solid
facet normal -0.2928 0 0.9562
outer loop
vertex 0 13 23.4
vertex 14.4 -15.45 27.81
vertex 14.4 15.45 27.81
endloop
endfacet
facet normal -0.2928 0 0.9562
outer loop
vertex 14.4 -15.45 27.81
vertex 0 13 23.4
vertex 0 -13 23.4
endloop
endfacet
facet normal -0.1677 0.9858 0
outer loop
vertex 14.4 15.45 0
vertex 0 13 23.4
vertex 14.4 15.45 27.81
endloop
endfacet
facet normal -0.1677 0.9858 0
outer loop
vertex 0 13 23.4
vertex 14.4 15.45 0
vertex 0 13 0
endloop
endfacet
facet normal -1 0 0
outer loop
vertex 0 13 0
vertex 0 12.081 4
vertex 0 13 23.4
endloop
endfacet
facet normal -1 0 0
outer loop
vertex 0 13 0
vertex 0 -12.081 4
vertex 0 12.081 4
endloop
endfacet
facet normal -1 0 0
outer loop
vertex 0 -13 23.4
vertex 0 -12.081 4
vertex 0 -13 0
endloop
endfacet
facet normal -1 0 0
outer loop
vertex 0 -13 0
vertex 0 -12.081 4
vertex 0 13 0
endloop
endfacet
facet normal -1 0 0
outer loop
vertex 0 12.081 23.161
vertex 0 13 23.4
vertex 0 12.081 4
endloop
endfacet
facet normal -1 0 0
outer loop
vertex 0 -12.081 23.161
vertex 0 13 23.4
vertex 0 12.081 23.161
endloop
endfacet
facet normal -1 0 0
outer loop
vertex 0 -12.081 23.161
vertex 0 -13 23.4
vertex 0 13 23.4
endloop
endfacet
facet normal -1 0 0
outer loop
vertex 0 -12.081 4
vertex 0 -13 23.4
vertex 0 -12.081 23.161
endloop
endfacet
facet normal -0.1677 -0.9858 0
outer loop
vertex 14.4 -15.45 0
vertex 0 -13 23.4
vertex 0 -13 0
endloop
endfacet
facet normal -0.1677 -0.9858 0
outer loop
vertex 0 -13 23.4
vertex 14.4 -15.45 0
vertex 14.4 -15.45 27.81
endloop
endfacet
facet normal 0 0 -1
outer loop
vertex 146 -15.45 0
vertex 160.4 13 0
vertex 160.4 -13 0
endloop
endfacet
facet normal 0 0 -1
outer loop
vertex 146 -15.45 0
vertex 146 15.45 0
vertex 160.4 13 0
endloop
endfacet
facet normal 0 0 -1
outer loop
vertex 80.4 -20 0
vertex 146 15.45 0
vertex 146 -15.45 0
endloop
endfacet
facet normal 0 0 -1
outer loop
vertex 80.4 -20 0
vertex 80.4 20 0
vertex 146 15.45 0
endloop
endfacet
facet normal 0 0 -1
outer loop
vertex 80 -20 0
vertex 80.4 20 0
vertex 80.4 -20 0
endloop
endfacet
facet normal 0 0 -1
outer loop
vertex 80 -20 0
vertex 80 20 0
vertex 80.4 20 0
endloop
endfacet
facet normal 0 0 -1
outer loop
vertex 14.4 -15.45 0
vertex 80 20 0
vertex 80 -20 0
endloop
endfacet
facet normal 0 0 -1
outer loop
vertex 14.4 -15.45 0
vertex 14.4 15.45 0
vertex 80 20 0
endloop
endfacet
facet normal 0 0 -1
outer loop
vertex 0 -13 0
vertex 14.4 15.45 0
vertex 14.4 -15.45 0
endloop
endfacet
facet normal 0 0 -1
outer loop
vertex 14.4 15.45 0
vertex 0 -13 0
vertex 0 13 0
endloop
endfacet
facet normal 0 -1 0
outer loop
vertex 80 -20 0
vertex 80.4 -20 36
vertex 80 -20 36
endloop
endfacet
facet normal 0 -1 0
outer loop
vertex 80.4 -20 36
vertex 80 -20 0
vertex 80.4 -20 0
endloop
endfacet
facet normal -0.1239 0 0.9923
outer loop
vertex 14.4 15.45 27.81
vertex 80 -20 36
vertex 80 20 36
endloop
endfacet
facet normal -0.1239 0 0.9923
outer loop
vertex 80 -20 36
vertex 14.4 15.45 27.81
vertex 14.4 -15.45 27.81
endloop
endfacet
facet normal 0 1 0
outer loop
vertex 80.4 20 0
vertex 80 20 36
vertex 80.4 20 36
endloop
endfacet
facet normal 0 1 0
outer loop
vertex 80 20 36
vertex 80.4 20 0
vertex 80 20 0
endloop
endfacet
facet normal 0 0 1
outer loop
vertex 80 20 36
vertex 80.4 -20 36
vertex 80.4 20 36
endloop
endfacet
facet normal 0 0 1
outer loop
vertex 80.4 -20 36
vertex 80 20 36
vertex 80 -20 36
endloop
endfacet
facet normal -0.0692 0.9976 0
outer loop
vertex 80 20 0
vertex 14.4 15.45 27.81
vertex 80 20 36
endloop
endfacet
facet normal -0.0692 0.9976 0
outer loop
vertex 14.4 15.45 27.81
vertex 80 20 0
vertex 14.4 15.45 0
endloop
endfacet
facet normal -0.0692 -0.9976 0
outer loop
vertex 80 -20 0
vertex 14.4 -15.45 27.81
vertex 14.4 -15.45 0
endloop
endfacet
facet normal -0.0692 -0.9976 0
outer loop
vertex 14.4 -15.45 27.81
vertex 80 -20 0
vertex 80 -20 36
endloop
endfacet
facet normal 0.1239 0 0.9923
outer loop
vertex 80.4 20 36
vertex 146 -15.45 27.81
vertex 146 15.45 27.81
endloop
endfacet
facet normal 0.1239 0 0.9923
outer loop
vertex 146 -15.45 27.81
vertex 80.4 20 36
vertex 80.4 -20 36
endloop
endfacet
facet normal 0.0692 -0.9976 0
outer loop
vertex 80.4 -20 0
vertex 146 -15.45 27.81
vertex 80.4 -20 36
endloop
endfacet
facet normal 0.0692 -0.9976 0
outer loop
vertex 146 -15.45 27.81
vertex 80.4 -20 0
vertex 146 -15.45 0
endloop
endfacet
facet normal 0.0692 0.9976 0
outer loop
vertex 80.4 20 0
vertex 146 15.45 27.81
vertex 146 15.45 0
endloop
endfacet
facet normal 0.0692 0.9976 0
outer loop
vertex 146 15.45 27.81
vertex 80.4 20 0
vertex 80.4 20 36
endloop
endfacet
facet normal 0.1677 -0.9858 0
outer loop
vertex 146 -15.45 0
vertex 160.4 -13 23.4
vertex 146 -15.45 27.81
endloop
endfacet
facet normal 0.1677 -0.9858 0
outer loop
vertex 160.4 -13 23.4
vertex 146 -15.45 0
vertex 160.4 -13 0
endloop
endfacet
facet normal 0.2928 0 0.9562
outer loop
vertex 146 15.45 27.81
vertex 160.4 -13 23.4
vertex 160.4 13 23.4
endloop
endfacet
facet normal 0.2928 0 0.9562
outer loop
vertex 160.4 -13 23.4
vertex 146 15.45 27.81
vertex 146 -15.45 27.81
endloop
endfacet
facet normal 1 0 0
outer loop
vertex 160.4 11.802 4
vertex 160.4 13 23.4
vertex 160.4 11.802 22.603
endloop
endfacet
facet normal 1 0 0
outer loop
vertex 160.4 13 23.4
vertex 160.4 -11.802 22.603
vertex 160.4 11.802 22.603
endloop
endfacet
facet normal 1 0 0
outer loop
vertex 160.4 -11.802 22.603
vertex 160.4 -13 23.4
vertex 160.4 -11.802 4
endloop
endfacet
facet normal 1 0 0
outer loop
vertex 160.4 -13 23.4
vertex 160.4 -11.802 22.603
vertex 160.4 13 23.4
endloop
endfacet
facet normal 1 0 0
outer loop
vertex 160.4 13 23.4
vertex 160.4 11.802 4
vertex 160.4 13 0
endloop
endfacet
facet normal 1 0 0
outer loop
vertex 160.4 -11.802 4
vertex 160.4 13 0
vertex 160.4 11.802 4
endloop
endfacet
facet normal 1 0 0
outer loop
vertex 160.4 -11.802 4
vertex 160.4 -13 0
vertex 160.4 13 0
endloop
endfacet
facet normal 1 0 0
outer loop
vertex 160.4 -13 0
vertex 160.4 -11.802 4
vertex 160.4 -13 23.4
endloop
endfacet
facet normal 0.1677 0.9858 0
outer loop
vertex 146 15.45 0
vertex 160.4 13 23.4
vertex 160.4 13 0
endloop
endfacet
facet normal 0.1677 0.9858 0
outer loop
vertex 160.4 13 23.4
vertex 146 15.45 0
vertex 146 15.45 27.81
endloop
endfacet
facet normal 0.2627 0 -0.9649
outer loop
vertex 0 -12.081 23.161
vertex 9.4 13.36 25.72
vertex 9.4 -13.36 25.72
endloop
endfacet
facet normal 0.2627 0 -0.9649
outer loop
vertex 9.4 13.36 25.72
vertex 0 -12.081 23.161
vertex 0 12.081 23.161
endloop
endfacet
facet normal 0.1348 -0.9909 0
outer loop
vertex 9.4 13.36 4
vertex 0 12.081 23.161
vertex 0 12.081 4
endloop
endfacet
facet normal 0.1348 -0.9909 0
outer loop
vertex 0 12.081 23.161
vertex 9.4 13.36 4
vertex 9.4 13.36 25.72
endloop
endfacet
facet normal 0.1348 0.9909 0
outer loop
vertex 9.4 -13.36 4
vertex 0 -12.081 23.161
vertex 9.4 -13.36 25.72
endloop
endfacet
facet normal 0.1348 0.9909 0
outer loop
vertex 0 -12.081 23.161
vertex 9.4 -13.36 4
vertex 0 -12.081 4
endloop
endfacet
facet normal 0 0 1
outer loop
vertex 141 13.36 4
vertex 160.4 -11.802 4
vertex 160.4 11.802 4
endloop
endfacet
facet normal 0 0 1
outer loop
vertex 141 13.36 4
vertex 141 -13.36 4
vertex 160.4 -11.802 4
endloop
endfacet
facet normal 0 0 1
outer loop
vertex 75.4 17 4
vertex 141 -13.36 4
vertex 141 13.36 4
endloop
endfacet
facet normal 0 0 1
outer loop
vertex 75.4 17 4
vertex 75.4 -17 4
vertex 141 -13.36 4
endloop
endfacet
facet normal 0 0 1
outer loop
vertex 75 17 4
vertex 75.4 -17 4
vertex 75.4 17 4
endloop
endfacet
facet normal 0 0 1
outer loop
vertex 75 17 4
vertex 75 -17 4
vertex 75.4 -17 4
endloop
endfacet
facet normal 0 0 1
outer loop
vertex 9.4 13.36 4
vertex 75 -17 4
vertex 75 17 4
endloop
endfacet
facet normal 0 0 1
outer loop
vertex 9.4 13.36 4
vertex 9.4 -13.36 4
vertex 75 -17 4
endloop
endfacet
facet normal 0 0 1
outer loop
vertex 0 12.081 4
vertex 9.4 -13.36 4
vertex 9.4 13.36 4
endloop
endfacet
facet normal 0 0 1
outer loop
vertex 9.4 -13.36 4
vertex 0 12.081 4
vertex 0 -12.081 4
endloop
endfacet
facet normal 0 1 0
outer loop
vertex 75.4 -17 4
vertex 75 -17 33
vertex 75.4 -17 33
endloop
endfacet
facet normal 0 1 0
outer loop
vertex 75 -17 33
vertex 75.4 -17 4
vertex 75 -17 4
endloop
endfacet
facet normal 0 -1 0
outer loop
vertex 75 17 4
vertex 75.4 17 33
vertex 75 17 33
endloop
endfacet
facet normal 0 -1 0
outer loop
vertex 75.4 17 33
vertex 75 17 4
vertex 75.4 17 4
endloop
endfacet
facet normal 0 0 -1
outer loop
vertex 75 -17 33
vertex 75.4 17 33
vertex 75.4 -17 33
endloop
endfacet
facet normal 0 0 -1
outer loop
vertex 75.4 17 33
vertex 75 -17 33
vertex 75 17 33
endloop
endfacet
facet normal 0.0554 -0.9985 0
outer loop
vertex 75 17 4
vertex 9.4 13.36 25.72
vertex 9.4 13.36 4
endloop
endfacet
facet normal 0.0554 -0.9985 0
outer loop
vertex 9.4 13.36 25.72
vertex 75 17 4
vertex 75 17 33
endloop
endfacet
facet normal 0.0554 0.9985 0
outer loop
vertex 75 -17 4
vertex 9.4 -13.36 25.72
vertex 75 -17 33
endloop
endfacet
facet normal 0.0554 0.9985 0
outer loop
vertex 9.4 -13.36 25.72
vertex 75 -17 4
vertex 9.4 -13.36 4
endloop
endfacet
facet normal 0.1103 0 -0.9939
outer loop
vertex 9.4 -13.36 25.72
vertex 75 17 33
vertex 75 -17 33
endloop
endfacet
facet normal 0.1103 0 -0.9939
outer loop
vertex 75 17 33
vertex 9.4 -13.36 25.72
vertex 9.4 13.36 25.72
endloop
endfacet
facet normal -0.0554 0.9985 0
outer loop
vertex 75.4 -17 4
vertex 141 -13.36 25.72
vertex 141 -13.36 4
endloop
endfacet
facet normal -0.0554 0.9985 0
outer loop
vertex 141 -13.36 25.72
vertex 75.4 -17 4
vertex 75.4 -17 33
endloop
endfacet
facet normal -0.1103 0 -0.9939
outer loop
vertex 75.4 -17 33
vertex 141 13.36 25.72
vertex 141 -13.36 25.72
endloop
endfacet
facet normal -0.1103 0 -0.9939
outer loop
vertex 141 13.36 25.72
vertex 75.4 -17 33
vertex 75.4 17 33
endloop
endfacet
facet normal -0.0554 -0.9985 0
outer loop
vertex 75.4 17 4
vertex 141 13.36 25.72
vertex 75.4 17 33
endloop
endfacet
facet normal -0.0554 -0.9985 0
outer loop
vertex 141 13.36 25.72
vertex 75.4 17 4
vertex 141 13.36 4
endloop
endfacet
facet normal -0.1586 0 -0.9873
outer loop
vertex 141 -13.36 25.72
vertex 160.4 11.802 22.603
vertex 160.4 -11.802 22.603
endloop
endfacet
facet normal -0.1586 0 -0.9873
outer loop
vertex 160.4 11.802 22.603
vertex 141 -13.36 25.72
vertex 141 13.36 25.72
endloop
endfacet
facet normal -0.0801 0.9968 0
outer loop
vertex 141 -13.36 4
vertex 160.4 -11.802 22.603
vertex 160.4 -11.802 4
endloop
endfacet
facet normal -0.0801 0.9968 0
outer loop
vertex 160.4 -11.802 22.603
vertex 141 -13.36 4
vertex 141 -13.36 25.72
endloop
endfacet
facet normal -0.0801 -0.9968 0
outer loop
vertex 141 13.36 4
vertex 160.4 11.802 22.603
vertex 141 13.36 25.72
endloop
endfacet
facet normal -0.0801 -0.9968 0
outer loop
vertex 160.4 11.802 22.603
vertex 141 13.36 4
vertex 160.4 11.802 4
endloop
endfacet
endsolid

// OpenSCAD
$fn = 32;

// ----------------------------------------------------------------------
// Faired channel: 160 x 40 x 36 mm, 3 mm walls, faired ends
// ----------------------------------------------------------------------

// --- parameters (mm) ---
length = 160;             // channel length
width = 40;               // channel width at mid length
height = 36;              // channel height at mid length
wall = 3;                 // side wall thickness
floor_t = 4;              // floor thickness
end_w = 26;               // faired end width
end_h = 23.4;             // faired end height

difference() {
  union() {
    hull() {
      translate([0, -13, 0]) cube([0.4, 26, 23.4]);
      translate([14.4, -15.45, 0]) cube([0.4, 30.9, 27.81]);
    }
    hull() {
      translate([14.4, -15.45, 0]) cube([0.4, 30.9, 27.81]);
      translate([80, -20, 0]) cube([0.4, 40, 36]);
    }
    hull() {
      translate([80, -20, 0]) cube([0.4, 40, 36]);
      translate([145.6, -15.45, 0]) cube([0.4, 30.9, 27.81]);
    }
    hull() {
      translate([145.6, -15.45, 0]) cube([0.4, 30.9, 27.81]);
      translate([160, -13, 0]) cube([0.4, 26, 23.4]);
    }
  }
  /* cavity, 5 mm proud of both ends so the ports are cut clean */
  hull() {
    translate([-5, -11.4, 4]) cube([0.4, 22.8, 17.8]);
    translate([9.4, -13.36, 4]) cube([0.4, 26.72, 21.72]);
  }
  hull() {
    translate([9.4, -13.36, 4]) cube([0.4, 26.72, 21.72]);
    translate([75, -17, 4]) cube([0.4, 34, 29]);
  }
  hull() {
    translate([75, -17, 4]) cube([0.4, 34, 29]);
    translate([140.6, -13.36, 4]) cube([0.4, 26.72, 21.72]);
  }
  hull() {
    translate([140.6, -13.36, 4]) cube([0.4, 26.72, 21.72]);
    translate([165, -11.4, 4]) cube([0.4, 22.8, 17.8]);
  }
}
